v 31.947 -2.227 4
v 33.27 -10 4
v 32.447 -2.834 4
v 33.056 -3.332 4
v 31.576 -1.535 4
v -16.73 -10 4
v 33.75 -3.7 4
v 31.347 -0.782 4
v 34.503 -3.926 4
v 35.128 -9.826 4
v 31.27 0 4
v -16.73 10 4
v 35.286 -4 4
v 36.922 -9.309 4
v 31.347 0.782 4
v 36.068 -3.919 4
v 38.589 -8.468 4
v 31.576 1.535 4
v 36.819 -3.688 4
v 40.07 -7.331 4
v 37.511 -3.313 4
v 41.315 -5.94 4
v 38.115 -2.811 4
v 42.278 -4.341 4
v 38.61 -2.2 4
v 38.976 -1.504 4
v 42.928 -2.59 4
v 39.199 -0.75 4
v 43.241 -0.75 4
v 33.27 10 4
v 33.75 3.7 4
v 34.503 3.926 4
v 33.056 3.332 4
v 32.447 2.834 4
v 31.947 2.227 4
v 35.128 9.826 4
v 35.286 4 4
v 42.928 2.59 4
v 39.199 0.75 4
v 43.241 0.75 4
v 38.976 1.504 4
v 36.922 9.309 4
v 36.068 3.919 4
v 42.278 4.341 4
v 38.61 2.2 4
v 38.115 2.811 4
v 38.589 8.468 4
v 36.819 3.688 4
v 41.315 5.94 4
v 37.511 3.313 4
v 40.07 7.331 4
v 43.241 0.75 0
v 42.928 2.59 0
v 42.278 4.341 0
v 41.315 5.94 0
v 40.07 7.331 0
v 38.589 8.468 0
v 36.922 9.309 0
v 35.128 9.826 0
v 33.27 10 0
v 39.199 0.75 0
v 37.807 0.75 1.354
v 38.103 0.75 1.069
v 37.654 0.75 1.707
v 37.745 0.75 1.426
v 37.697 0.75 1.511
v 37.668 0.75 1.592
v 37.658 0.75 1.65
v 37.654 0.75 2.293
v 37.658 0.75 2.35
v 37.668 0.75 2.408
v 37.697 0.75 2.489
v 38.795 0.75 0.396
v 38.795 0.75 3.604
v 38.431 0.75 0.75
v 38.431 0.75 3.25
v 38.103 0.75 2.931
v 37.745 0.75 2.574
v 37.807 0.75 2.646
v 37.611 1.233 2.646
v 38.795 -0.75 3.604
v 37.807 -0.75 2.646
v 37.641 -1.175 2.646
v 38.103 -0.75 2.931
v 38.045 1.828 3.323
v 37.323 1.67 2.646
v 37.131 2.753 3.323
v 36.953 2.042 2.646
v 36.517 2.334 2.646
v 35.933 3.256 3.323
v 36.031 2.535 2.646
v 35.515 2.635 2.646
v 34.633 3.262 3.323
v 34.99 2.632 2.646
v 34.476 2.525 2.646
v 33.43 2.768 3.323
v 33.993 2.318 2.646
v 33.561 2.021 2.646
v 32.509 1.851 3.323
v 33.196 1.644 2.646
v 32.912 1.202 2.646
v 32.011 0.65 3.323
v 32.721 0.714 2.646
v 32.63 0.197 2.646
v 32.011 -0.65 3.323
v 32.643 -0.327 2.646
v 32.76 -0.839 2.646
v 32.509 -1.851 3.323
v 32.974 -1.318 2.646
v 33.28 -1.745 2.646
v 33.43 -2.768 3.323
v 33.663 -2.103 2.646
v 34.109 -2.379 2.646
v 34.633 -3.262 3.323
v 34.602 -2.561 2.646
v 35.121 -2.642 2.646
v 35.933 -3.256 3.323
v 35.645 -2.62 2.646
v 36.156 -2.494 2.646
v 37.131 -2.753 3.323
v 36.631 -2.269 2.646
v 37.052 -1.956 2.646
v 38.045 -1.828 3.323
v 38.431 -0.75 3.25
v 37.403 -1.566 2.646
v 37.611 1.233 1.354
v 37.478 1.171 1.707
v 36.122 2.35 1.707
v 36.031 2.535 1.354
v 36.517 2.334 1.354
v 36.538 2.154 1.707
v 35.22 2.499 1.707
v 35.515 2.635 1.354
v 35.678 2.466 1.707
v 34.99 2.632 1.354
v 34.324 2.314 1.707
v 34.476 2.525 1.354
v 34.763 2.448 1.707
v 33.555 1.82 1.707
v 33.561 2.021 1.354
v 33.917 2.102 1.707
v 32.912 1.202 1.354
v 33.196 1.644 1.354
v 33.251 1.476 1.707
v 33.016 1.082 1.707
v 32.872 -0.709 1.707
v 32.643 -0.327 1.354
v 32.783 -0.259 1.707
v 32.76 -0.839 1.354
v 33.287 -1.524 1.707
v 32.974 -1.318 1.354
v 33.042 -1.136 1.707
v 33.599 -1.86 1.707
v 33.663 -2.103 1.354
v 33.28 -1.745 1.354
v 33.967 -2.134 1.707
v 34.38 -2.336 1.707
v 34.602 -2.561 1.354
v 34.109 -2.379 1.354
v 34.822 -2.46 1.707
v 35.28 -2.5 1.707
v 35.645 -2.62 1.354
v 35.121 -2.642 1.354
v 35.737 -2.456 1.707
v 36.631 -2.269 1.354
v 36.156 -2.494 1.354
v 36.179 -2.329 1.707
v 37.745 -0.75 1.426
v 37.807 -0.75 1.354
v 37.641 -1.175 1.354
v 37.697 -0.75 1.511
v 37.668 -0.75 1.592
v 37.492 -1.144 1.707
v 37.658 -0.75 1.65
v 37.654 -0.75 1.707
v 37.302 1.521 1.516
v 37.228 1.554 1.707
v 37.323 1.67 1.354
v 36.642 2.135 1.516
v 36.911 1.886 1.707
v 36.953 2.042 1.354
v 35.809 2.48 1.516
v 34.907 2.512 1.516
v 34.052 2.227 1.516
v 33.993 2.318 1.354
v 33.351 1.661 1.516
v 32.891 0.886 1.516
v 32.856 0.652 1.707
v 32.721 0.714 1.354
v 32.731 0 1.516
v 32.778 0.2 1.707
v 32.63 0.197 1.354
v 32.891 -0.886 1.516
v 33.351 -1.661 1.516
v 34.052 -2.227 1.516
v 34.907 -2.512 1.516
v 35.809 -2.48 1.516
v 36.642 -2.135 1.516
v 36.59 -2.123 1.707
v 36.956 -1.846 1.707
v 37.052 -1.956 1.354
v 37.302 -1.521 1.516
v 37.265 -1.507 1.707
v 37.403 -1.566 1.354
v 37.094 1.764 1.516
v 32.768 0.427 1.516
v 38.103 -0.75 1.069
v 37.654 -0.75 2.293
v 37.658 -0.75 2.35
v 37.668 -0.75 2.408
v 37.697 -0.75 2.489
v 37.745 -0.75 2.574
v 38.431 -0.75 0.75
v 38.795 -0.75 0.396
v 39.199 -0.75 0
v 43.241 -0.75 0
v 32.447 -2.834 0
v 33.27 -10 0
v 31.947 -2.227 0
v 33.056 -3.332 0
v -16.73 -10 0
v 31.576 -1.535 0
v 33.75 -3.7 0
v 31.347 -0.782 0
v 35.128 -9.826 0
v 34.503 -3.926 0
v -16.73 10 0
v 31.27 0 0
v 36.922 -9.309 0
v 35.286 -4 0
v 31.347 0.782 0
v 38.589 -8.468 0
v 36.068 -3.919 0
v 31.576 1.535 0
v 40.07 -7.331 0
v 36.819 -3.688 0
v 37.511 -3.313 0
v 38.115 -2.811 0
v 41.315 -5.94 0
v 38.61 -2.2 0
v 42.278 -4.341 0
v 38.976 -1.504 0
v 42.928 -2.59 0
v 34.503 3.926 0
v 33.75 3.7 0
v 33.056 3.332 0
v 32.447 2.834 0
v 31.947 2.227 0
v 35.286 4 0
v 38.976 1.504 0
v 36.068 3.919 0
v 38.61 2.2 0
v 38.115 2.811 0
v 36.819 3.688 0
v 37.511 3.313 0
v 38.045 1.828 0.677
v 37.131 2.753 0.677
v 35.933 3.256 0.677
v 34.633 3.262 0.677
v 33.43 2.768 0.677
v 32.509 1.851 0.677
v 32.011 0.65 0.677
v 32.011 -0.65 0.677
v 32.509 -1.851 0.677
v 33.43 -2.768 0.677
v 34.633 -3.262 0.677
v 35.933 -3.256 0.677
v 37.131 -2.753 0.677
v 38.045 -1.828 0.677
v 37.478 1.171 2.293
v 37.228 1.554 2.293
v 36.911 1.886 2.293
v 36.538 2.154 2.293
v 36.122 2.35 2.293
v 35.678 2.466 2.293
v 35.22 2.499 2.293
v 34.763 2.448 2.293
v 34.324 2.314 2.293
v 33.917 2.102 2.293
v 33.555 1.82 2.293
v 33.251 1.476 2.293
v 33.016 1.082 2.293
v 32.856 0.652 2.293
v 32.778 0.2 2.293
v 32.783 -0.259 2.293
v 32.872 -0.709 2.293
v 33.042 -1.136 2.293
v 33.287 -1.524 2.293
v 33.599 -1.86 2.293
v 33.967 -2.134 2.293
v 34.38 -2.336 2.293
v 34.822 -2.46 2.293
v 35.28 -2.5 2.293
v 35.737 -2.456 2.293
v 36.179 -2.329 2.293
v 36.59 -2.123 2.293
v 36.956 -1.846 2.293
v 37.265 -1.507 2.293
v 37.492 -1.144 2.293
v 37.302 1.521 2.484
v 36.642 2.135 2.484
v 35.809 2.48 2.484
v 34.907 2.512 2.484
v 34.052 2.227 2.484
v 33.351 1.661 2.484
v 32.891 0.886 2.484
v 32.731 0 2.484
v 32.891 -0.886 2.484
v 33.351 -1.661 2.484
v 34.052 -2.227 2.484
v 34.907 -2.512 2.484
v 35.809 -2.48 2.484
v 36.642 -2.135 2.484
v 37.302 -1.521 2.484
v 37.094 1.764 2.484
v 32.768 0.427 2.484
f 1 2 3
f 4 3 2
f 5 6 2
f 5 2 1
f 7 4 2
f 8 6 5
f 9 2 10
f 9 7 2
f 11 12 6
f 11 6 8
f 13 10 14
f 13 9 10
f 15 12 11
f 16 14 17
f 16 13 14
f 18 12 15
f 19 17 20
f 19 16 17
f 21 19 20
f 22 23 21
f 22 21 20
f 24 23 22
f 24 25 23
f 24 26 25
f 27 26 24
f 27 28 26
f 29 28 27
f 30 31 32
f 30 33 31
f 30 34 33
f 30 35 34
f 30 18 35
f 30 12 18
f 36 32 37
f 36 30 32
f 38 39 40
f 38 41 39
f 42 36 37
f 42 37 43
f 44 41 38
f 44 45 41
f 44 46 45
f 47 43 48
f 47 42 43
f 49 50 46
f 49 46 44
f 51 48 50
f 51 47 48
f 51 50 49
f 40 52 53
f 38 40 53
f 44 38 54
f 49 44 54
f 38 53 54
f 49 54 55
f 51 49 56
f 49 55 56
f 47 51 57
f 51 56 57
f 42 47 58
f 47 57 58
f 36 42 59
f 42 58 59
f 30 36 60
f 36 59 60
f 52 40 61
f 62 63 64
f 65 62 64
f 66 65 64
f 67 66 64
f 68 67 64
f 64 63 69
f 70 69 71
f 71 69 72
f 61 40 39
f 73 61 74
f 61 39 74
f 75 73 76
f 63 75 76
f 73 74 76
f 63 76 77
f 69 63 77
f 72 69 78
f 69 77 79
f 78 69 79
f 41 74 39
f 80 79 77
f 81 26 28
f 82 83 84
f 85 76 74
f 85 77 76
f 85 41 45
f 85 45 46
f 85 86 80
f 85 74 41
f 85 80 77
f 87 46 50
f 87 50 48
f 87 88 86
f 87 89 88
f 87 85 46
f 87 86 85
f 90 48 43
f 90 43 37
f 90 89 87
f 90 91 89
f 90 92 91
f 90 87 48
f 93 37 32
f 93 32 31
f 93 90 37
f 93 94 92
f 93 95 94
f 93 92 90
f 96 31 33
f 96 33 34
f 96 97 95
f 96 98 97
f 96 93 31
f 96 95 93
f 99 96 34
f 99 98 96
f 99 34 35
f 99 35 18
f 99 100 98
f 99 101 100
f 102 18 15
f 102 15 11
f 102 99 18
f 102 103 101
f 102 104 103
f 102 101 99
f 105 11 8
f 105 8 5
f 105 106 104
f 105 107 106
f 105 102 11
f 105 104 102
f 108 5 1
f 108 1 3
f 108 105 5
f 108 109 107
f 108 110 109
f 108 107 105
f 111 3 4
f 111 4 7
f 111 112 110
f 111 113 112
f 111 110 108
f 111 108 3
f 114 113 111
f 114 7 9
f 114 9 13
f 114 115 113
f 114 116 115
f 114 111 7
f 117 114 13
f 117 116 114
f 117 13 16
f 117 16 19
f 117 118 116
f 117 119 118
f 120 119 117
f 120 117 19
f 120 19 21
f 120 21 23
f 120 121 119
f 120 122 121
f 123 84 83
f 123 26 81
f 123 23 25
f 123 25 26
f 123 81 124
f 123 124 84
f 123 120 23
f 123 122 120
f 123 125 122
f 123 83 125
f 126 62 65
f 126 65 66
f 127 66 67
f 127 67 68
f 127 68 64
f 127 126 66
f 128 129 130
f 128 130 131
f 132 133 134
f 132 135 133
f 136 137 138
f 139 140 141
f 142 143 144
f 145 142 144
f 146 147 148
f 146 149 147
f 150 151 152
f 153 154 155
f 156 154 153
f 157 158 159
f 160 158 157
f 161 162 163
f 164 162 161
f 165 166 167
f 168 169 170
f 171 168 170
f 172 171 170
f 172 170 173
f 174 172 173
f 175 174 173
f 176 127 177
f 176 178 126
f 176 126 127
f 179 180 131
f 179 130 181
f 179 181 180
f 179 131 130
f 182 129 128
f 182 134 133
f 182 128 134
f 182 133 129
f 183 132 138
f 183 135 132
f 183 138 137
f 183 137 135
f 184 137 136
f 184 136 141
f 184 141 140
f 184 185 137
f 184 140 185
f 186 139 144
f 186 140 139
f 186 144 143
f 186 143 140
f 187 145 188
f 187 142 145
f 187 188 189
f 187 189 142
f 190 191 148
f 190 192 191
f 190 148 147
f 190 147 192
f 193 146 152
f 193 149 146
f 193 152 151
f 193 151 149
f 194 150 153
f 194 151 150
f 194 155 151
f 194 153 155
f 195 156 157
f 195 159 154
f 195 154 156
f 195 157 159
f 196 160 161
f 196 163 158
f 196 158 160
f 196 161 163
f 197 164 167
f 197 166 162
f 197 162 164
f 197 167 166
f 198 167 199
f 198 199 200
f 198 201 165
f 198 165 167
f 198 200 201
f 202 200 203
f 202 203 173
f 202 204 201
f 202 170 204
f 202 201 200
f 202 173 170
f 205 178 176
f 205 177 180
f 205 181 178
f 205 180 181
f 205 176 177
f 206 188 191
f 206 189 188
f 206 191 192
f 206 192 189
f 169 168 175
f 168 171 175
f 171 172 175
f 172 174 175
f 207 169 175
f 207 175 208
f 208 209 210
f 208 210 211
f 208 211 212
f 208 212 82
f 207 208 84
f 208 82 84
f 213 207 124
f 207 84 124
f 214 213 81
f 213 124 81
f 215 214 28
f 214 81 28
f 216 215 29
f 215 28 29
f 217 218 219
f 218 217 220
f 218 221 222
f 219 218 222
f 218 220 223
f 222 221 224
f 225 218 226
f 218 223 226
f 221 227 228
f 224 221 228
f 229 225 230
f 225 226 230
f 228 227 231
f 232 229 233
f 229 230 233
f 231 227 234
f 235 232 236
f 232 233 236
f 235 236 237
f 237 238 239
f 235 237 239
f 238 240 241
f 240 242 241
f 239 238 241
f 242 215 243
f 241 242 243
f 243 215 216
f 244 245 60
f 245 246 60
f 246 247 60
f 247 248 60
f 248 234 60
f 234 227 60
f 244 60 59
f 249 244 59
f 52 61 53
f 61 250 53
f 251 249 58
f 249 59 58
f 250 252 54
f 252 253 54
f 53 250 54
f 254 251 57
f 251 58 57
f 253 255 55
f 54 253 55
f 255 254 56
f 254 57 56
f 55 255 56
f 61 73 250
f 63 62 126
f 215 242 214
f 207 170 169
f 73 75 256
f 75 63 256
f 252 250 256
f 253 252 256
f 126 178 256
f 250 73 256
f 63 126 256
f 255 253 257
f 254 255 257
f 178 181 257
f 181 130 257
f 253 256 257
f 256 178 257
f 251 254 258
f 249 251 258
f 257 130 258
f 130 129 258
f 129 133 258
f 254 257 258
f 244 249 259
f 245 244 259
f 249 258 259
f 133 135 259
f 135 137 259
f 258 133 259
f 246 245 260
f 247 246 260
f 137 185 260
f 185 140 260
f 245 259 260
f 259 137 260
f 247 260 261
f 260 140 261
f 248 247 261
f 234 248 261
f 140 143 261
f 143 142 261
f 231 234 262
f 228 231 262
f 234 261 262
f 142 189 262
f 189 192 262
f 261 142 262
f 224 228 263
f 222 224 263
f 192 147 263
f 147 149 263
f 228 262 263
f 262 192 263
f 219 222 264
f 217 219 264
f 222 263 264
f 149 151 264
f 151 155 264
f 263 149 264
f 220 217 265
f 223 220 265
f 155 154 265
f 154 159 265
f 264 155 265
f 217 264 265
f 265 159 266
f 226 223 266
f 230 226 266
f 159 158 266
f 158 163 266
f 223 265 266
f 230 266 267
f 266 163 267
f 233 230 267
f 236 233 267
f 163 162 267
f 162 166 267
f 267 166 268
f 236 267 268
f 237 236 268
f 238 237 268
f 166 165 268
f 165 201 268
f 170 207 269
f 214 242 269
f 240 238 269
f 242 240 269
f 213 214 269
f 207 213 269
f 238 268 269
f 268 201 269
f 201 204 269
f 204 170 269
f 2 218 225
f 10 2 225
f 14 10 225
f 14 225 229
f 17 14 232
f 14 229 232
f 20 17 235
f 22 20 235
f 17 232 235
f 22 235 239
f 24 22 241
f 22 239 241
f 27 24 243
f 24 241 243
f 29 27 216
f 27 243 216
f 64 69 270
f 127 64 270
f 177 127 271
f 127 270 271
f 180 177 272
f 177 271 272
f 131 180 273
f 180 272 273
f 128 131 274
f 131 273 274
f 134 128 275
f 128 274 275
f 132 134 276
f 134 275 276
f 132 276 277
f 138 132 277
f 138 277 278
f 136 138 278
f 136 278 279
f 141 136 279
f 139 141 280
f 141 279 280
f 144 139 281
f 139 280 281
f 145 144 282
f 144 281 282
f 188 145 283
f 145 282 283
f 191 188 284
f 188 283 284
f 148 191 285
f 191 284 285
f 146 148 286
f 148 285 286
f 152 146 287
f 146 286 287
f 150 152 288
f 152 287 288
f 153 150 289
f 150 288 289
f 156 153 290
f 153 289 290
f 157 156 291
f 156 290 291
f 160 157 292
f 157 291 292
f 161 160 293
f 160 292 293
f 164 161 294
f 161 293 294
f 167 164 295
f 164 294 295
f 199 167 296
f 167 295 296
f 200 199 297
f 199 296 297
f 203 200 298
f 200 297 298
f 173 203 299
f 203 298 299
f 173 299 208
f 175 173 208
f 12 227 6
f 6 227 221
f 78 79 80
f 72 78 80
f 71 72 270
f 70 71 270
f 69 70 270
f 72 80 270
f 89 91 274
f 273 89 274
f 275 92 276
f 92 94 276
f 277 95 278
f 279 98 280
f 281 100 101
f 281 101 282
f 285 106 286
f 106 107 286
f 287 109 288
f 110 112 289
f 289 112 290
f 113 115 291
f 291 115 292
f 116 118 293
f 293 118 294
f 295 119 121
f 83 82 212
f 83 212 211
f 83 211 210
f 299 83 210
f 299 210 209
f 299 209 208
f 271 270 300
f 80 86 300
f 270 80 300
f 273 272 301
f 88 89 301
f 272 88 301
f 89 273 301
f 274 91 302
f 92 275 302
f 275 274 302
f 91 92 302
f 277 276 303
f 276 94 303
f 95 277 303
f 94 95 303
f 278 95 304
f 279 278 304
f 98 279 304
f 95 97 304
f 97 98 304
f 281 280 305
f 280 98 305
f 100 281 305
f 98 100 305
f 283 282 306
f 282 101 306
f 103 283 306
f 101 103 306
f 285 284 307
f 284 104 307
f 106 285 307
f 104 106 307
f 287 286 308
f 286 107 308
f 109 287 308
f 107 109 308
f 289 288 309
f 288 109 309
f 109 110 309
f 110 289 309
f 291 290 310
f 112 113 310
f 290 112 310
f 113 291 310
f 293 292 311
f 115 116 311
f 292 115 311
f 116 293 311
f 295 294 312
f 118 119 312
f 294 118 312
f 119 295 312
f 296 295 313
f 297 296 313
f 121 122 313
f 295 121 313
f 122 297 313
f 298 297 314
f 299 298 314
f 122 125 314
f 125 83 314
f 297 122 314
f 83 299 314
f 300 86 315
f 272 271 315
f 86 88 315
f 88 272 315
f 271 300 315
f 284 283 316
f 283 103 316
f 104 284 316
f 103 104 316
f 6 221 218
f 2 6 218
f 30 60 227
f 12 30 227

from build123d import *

# Parameters (mm, degrees)
F1_DEPTH = 4
F3_DEPTH = 4.001
F4_SIZE  = 1.5
F5_R     = 0.5


with BuildPart() as f1:
    # F0 (on Top) → F1 (new body)
    with BuildSketch(Plane.XY):
        with BuildLine():
            Line((-16.7304610461, 10), (-16.7304610461, 0))
            Line((-16.7304610461, 0), (-16.7304610461, -10))
            Line((-16.7304610461, -10), (33.2695389539, -10))
            ThreePointArc((33.2695389539, -10), (43.2695389539, 0), (33.2695389539, 10))
            Line((33.2695389539, 10), (-16.7304610461, 10))
        make_face()
    extrude(amount=F1_DEPTH)

    # F2 (on face) → F3 (cut, through all)
    with BuildSketch(Plane.XY.offset(4)):
        with BuildLine():
            Line((37.6543869574, -0.75), (43.2413742915, -0.75))
            ThreePointArc((43.2413742915, -0.75), (43.2695389539, 0), (43.2413742915, 0.75))
            Line((43.2413742915, 0.75), (37.6543869574, 0.75))
            ThreePointArc((37.6543869574, 0.75), (37.7405832684, 0.3793942482), (37.7695389539, 0))
            ThreePointArc((37.7695389539, 0), (37.7405832684, -0.3793942482), (37.6543869574, -0.75))
        make_face()
        with BuildLine():
            ThreePointArc((37.6543869574, 0.75), (32.7695389539, 0), (37.6543869574, -0.75))
            Line((37.6543869574, -0.75), (35.2695389539, -0.75))
            Line((35.2695389539, -0.75), (35.2695389539, 0.75))
            Line((35.2695389539, 0.75), (37.6543869574, 0.75))
        make_face()
        with BuildLine():
            Line((35.2695389539, -0.75), (37.6543869574, -0.75))
            ThreePointArc((37.6543869574, -0.75), (37.7405832684, -0.3793942482), (37.7695389539, 0))
            ThreePointArc((37.7695389539, 0), (37.7405832684, 0.3793942482), (37.6543869574, 0.75))
            Line((37.6543869574, 0.75), (35.2695389539, 0.75))
            Line((35.2695389539, 0.75), (35.2695389539, -0.75))
        make_face()
    extrude(amount=-F3_DEPTH, mode=Mode.SUBTRACT)

    # F4
    f4_edges = [f1.edges().sort_by_distance(p)[0] for p in [
        (32.769539, 0, 4),
        (32.769539, 0, 0),
    ]]
    chamfer(f4_edges, length=F4_SIZE)

    # F5
    f5_edges = [f1.edges().sort_by_distance(p)[0] for p in [
        (32.769539, 0, 2.5),
        (32.769539, 0, 1.5),
    ]]
    fillet(f5_edges, radius=F5_R)


solid = f1.part
